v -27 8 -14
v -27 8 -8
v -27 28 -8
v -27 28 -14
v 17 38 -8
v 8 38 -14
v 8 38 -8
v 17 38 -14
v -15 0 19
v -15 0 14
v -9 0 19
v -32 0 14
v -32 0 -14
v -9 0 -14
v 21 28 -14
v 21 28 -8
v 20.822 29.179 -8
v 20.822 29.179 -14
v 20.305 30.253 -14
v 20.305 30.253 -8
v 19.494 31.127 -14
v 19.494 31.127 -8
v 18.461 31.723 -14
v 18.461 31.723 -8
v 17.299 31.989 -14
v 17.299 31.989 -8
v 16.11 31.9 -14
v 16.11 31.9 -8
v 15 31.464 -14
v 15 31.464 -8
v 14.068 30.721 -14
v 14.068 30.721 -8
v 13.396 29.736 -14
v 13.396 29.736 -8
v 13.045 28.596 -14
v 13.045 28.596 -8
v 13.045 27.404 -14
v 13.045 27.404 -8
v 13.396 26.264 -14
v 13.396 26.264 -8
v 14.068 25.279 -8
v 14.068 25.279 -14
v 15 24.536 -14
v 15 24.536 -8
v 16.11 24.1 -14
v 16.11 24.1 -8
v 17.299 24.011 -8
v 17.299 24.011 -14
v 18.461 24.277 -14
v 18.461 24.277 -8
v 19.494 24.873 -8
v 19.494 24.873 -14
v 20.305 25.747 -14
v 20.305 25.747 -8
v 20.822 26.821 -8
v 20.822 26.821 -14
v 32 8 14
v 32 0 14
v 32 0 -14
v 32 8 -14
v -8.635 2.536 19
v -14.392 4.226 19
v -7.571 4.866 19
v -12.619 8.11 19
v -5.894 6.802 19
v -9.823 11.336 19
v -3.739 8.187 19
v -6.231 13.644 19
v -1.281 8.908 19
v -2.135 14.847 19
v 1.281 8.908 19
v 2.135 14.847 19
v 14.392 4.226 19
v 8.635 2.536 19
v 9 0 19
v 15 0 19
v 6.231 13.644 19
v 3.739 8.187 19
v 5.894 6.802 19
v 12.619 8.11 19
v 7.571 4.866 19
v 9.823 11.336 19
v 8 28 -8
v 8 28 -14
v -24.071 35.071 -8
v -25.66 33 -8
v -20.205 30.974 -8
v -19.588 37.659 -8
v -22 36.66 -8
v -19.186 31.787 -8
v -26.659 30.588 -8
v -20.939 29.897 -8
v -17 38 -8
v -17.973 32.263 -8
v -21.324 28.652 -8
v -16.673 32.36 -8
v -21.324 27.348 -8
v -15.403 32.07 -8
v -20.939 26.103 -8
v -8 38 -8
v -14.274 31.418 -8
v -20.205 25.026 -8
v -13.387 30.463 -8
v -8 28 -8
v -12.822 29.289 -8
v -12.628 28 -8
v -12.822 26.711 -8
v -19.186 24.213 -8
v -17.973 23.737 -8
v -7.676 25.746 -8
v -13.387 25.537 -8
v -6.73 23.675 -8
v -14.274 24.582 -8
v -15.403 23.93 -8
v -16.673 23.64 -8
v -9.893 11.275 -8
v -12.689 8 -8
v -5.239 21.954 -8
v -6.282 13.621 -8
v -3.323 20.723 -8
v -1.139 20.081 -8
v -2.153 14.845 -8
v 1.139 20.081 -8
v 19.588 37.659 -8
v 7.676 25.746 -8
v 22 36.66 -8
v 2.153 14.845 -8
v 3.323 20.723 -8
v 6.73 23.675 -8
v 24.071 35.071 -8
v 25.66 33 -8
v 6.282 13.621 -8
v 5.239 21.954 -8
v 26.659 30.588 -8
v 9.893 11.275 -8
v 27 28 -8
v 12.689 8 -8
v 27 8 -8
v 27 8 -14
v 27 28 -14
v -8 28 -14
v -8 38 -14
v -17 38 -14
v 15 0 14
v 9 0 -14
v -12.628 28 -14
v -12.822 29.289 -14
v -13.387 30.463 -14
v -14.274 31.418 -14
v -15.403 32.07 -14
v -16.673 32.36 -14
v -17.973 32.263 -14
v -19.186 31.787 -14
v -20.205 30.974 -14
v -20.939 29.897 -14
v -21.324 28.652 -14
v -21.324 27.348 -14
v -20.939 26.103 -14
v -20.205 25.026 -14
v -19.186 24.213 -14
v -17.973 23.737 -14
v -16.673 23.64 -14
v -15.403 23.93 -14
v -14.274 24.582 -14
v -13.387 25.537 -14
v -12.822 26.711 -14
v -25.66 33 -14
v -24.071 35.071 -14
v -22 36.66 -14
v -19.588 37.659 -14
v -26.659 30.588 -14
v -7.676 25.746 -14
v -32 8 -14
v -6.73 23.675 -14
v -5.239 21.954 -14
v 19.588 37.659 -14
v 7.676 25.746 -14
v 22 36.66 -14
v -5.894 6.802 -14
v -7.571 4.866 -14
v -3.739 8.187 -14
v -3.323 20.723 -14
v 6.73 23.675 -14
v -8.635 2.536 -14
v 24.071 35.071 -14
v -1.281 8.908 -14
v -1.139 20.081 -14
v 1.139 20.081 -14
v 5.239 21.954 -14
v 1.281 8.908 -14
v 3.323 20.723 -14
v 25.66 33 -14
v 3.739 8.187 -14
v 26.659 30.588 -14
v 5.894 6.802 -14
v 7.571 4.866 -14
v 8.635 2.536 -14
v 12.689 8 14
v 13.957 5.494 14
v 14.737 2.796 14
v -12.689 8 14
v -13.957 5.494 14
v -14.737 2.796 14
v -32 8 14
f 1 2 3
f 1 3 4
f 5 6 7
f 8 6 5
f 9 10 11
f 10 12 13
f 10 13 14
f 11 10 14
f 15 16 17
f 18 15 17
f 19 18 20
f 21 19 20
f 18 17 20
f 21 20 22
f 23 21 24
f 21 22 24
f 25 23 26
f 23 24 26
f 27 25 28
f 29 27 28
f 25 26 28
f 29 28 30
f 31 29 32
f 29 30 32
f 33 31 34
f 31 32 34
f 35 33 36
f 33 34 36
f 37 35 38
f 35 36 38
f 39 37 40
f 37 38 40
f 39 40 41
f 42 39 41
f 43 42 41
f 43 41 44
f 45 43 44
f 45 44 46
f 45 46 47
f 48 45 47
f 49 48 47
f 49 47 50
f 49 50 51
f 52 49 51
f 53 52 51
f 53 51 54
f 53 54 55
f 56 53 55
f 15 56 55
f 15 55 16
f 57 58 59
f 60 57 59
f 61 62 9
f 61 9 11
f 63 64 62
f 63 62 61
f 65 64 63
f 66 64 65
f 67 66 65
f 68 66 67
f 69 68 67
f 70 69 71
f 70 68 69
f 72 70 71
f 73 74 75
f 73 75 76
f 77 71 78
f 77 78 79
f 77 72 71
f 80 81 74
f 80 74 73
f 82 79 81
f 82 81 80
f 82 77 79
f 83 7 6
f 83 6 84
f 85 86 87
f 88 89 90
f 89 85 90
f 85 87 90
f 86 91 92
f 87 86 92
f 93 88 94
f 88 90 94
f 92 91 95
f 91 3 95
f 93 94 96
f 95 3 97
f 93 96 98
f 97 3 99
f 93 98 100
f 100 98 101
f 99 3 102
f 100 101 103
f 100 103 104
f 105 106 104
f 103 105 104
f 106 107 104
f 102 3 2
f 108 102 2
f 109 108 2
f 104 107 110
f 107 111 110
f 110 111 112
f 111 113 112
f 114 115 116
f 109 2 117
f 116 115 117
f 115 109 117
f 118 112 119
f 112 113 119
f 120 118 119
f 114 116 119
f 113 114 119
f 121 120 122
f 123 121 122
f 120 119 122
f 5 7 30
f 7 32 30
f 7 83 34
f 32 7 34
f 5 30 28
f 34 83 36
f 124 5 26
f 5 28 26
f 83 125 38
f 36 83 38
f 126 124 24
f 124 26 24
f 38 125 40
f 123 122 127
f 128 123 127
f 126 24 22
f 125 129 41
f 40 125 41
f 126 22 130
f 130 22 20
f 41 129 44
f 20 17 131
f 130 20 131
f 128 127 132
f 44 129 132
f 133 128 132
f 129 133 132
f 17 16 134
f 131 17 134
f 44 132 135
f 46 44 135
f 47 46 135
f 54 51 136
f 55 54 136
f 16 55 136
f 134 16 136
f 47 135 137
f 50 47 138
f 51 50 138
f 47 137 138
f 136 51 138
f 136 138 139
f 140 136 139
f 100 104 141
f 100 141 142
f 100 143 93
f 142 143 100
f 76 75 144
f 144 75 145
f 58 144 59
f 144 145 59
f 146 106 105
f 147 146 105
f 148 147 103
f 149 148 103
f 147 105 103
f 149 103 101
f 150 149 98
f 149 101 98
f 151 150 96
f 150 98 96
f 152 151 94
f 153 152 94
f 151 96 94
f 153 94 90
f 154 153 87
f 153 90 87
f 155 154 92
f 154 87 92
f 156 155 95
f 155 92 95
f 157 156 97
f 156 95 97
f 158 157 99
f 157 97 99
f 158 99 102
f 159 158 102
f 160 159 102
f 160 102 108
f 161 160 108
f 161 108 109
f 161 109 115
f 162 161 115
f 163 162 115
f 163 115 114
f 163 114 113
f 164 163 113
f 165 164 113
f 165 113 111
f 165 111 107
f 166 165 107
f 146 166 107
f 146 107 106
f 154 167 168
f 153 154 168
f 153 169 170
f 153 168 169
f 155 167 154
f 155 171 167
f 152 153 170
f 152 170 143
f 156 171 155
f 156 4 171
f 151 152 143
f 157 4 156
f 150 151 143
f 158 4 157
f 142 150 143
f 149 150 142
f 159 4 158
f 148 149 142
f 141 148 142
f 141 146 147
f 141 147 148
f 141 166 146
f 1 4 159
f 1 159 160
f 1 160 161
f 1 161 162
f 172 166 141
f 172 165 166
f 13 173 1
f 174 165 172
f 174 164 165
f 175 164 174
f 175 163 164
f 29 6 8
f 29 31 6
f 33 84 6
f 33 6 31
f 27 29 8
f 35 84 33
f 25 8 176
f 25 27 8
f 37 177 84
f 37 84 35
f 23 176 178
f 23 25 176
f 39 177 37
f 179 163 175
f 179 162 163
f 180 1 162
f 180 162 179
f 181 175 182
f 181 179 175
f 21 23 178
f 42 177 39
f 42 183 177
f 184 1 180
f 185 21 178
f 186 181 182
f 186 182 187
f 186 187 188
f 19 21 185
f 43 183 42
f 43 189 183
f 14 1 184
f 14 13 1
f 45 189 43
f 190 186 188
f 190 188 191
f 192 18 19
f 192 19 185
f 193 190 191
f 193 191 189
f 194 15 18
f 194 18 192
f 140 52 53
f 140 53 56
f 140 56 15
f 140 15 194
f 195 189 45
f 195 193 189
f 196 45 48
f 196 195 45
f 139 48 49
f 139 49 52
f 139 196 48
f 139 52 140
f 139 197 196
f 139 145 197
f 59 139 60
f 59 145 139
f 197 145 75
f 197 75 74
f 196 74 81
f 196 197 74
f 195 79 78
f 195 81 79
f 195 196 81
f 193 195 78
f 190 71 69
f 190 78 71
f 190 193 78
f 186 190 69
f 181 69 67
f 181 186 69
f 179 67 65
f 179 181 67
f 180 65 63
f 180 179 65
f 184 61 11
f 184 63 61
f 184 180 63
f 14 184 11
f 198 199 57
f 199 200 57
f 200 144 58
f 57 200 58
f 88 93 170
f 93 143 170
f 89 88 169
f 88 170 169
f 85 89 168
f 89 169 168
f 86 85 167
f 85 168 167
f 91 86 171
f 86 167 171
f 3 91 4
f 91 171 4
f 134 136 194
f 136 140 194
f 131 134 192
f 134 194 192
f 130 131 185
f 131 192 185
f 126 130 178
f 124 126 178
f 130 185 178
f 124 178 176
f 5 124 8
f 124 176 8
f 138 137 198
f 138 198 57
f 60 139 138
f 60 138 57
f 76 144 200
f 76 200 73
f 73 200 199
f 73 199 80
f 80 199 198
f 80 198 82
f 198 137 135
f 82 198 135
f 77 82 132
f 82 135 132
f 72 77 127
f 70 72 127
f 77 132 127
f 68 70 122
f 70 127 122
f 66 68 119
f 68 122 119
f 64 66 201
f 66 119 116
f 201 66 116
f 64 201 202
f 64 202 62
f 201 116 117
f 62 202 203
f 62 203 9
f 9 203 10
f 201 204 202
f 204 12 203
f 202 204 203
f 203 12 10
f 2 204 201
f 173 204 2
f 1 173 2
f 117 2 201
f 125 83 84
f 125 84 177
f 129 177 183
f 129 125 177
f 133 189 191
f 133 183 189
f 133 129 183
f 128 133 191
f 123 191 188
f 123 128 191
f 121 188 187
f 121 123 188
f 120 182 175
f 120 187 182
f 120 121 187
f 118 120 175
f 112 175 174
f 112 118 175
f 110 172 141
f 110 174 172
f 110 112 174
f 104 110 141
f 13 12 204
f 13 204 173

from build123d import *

# Parameters (mm, degrees)
SKETCH_1_W               = 64
SKETCH_1_H               = 28
EXTRUDE_1_DEPTH          = 8
SKETCH_2_W               = 54
SKETCH_2_H               = 6
EXTRUDE_2_DEPTH          = 38
FILLET_1_R               = 10
EXTRUDE_3_DEPTH          = 19
EXTRUDE_3_DEPTH_BACK     = 13
CUT_EXTRUDE_1_DEPTH      = 21
CUT_EXTRUDE_1_DEPTH_BACK = 21
SKETCH_5_R               = 4.372337206
SKETCH_5_R_2             = 4
CUT_EXTRUDE_3_DEPTH      = 100


with BuildPart() as part:
    # 草图1 → 凸台-拉伸1 (new body)
    with BuildSketch(Plane(origin=(0, 0, 0), x_dir=(1, 0, 0), z_dir=(0, 1, 0))):
        Rectangle(SKETCH_1_W, SKETCH_1_H)
    extrude(amount=EXTRUDE_1_DEPTH)

    # 草图2 → 凸台-拉伸2 (add)
    with BuildSketch(Plane(origin=(0, 0, 0), x_dir=(1, 0, 0), z_dir=(0, 1, 0))):
        with Locations((0, 11)):
            Rectangle(SKETCH_2_W, SKETCH_2_H)
    extrude(amount=EXTRUDE_2_DEPTH)

    # 圆角1
    fillet_1_edges = [part.edges().sort_by_distance(p)[0] for p in [
        (-27, 38, -11),
        (27, 38, -11),
    ]]
    fillet(fillet_1_edges, radius=FILLET_1_R)

    # 草图3 → 凸台-拉伸3 (add, two sides: drawn at the far end of the back side and taken through both)
    with BuildSketch(Plane.XY.offset(-EXTRUDE_3_DEPTH_BACK)):
        with BuildLine():
            Line((-15, 0), (15, 0))
            ThreePointArc((15, 0), (0, 15), (-15, 0))
        make_face()
    extrude(amount=EXTRUDE_3_DEPTH + EXTRUDE_3_DEPTH_BACK)

    # 草图4 → 切除-拉伸1 (cut, two sides: drawn at the far end of the back side and taken through both)
    with BuildSketch(Plane.XY.offset(-CUT_EXTRUDE_1_DEPTH_BACK)):
        with BuildLine():
            Line((-9, 0), (9, 0))
            ThreePointArc((9, 0), (0, 9), (-9, 0))
        make_face()
    extrude(amount=CUT_EXTRUDE_1_DEPTH + CUT_EXTRUDE_1_DEPTH_BACK, mode=Mode.SUBTRACT)

    # 草图5 → 切除-拉伸3 (cut)
    with BuildSketch(Plane.XY):
        with Locations((-17, 28)):
            Circle(SKETCH_5_R)
        with Locations((17, 28)):
            Circle(SKETCH_5_R_2)
        with BuildLine():
            Line((-8, 28), (-8, 38))
            Line((-8, 38), (8, 38))
            Line((8, 38), (8, 28))
            ThreePointArc((8, 28), (0, 20), (-8, 28))
        make_face()
    extrude(amount=-CUT_EXTRUDE_3_DEPTH, mode=Mode.SUBTRACT)


solid = part.part
